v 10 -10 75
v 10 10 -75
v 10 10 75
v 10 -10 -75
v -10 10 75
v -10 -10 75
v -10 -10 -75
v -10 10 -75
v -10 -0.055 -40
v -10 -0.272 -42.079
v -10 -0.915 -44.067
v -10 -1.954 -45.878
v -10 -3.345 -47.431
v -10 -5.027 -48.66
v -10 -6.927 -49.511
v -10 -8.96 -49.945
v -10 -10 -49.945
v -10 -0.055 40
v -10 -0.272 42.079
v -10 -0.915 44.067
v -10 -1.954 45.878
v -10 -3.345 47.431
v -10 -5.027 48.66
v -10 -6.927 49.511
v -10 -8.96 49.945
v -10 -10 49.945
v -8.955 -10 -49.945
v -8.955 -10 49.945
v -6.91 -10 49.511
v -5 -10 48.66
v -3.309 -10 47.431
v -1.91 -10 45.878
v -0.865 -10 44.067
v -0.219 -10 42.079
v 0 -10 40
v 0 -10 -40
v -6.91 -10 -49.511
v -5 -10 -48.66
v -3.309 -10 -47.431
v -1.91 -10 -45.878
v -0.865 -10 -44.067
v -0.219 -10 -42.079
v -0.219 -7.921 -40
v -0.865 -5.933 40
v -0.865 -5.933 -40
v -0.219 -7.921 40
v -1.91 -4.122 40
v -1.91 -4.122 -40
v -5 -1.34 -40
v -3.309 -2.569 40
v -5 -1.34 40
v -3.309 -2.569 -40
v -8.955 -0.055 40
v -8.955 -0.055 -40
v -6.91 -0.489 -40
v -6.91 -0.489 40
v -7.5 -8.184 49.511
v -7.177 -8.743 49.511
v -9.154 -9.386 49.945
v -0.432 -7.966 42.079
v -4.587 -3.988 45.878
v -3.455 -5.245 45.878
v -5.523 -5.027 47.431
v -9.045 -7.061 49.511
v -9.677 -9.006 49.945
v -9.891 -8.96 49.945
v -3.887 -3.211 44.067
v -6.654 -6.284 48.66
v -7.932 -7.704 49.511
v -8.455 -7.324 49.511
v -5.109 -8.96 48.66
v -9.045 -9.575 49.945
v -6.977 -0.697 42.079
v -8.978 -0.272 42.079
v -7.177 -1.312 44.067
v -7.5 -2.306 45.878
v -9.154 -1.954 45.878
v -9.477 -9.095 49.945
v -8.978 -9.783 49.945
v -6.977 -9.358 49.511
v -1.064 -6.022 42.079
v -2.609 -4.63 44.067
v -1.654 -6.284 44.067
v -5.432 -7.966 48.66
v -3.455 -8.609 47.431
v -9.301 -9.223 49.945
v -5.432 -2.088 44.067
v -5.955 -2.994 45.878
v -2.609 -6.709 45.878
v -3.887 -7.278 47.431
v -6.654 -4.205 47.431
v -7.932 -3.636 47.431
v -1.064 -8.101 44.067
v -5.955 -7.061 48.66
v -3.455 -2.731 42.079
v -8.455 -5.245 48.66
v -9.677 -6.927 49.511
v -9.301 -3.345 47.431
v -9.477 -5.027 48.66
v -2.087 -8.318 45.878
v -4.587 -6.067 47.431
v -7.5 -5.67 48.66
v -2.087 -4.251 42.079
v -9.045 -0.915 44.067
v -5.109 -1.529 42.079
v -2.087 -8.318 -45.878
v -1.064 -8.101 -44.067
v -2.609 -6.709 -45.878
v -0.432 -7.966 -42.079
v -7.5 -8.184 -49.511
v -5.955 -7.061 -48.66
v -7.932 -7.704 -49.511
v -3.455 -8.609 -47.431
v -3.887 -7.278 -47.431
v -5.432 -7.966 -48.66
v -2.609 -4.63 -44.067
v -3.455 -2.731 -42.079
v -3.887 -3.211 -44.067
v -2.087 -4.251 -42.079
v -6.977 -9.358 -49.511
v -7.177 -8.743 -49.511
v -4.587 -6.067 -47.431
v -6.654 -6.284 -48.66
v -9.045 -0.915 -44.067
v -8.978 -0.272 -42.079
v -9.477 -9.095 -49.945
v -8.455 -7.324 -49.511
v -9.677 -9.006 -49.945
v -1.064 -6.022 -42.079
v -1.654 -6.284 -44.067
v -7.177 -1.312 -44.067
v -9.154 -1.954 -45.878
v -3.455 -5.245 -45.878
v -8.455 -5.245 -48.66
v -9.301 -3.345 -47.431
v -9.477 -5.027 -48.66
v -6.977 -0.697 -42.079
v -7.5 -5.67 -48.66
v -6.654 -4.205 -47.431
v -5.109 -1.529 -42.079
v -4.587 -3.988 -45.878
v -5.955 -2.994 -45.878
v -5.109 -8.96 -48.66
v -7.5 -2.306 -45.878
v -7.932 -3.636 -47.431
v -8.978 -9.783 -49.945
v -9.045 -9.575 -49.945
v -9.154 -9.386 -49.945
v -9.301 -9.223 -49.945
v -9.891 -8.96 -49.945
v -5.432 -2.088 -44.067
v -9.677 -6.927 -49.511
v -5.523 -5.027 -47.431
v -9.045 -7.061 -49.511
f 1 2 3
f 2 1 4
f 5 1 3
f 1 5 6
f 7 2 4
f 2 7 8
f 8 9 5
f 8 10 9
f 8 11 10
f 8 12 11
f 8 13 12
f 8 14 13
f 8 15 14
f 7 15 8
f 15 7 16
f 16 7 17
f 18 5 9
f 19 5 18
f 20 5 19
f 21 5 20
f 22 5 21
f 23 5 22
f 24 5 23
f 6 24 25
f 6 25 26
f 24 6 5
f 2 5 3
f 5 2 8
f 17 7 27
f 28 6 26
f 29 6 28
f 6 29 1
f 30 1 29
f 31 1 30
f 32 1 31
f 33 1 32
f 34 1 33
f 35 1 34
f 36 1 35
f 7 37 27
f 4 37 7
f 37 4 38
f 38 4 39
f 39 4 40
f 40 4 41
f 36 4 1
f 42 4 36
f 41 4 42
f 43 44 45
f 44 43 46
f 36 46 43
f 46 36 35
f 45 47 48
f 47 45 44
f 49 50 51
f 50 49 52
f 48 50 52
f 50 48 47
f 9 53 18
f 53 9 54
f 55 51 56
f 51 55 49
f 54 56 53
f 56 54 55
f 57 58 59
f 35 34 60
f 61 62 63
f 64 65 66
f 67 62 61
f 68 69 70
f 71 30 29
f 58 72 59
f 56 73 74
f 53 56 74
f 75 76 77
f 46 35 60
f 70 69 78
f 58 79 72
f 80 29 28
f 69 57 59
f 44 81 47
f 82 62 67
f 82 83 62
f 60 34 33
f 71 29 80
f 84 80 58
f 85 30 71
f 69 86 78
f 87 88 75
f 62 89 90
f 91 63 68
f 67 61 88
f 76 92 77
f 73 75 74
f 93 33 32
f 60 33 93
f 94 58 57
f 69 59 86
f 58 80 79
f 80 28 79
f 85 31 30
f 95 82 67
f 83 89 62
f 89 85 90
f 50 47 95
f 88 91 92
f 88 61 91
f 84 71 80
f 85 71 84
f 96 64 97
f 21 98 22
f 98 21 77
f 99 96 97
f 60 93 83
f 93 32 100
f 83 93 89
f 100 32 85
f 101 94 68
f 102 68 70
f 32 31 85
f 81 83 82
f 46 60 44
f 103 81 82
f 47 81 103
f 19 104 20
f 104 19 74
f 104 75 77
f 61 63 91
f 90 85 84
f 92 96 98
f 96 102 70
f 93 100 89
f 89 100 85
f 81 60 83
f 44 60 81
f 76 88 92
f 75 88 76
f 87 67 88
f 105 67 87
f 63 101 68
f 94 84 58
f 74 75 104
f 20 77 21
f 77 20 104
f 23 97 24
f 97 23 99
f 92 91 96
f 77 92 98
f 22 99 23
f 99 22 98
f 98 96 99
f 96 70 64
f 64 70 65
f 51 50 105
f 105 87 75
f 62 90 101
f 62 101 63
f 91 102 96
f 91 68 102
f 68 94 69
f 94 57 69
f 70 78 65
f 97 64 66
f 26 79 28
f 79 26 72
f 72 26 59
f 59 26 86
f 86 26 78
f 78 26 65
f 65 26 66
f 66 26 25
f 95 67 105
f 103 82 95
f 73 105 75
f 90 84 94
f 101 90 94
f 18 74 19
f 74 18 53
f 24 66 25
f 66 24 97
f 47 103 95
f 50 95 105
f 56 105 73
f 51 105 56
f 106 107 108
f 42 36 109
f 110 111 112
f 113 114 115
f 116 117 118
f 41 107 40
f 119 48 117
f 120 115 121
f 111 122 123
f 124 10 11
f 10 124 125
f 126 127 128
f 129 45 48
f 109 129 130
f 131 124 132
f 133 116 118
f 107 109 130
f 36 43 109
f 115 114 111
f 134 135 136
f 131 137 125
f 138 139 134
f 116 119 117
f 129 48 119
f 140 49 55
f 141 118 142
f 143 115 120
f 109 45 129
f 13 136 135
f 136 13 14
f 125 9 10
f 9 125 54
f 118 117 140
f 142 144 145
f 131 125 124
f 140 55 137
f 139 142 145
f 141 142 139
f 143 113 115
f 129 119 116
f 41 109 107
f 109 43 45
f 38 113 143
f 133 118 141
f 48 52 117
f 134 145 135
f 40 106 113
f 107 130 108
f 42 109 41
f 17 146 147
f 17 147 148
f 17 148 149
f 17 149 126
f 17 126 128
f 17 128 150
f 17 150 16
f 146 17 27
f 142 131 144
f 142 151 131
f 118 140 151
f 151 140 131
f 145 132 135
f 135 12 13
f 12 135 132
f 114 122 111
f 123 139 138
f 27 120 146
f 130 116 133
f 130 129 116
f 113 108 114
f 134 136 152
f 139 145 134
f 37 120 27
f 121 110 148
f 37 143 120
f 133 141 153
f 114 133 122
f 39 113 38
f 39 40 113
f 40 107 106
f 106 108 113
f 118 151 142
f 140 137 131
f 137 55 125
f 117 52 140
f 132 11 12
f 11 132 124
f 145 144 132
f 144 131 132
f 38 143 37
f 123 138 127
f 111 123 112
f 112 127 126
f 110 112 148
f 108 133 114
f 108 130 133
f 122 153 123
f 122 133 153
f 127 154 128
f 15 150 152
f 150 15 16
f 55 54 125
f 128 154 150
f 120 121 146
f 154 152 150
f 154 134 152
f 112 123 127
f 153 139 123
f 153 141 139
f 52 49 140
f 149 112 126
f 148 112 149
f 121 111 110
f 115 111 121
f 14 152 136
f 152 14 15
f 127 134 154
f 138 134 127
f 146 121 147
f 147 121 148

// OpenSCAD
difference() {
 cube([20, 20, 150], center = true);
 translate([-10, -10, 0])
  cylinder(h = 80, r = 10, center = true);
 translate([-10, -10, +40])
  sphere(r = 10);
 translate([-10, -10, -40])
  sphere(r = 10);
}
